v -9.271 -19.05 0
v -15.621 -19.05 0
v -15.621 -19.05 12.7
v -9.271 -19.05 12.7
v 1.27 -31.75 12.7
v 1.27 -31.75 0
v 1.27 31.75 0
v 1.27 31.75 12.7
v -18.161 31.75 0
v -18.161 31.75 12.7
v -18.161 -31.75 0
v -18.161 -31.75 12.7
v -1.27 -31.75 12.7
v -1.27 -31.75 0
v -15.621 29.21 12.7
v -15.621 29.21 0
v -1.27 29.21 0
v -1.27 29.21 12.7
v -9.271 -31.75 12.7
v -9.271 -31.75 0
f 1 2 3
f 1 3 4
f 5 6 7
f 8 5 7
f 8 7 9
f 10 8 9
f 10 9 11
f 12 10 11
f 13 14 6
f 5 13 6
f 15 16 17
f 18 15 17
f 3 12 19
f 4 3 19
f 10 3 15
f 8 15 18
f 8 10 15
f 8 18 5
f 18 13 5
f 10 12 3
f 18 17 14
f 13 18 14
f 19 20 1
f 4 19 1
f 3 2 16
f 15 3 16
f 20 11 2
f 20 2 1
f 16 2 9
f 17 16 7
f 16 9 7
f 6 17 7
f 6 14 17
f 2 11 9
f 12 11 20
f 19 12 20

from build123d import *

# Parameters (mm, degrees)
F0_W     = 6.35
F0_H     = 12.7
F0_W_2   = 14.351
F0_H_2   = 2.54
F1_DEPTH = 12.7


with BuildPart() as f1:
    # F0 (on Top) → F1 (new body)
    with BuildSketch(Plane.XY):
        with Locations((-12.446, -25.4)):
            Rectangle(F0_W, F0_H)
        Polygon((-15.621, -19.05), (-15.621, 29.21), (-15.621, 31.75), (-18.161, 31.75), (-18.161, -31.75), (-15.621, -31.75), align=None)
        with Locations((-8.4455, 30.48)):
            Rectangle(F0_W_2, F0_H_2)
        Polygon((-1.27, -31.75), (1.27, -31.75), (1.27, 31.75), (-1.27, 31.75), (-1.27, 29.21), align=None)
    extrude(amount=F1_DEPTH)


solid = f1.part
